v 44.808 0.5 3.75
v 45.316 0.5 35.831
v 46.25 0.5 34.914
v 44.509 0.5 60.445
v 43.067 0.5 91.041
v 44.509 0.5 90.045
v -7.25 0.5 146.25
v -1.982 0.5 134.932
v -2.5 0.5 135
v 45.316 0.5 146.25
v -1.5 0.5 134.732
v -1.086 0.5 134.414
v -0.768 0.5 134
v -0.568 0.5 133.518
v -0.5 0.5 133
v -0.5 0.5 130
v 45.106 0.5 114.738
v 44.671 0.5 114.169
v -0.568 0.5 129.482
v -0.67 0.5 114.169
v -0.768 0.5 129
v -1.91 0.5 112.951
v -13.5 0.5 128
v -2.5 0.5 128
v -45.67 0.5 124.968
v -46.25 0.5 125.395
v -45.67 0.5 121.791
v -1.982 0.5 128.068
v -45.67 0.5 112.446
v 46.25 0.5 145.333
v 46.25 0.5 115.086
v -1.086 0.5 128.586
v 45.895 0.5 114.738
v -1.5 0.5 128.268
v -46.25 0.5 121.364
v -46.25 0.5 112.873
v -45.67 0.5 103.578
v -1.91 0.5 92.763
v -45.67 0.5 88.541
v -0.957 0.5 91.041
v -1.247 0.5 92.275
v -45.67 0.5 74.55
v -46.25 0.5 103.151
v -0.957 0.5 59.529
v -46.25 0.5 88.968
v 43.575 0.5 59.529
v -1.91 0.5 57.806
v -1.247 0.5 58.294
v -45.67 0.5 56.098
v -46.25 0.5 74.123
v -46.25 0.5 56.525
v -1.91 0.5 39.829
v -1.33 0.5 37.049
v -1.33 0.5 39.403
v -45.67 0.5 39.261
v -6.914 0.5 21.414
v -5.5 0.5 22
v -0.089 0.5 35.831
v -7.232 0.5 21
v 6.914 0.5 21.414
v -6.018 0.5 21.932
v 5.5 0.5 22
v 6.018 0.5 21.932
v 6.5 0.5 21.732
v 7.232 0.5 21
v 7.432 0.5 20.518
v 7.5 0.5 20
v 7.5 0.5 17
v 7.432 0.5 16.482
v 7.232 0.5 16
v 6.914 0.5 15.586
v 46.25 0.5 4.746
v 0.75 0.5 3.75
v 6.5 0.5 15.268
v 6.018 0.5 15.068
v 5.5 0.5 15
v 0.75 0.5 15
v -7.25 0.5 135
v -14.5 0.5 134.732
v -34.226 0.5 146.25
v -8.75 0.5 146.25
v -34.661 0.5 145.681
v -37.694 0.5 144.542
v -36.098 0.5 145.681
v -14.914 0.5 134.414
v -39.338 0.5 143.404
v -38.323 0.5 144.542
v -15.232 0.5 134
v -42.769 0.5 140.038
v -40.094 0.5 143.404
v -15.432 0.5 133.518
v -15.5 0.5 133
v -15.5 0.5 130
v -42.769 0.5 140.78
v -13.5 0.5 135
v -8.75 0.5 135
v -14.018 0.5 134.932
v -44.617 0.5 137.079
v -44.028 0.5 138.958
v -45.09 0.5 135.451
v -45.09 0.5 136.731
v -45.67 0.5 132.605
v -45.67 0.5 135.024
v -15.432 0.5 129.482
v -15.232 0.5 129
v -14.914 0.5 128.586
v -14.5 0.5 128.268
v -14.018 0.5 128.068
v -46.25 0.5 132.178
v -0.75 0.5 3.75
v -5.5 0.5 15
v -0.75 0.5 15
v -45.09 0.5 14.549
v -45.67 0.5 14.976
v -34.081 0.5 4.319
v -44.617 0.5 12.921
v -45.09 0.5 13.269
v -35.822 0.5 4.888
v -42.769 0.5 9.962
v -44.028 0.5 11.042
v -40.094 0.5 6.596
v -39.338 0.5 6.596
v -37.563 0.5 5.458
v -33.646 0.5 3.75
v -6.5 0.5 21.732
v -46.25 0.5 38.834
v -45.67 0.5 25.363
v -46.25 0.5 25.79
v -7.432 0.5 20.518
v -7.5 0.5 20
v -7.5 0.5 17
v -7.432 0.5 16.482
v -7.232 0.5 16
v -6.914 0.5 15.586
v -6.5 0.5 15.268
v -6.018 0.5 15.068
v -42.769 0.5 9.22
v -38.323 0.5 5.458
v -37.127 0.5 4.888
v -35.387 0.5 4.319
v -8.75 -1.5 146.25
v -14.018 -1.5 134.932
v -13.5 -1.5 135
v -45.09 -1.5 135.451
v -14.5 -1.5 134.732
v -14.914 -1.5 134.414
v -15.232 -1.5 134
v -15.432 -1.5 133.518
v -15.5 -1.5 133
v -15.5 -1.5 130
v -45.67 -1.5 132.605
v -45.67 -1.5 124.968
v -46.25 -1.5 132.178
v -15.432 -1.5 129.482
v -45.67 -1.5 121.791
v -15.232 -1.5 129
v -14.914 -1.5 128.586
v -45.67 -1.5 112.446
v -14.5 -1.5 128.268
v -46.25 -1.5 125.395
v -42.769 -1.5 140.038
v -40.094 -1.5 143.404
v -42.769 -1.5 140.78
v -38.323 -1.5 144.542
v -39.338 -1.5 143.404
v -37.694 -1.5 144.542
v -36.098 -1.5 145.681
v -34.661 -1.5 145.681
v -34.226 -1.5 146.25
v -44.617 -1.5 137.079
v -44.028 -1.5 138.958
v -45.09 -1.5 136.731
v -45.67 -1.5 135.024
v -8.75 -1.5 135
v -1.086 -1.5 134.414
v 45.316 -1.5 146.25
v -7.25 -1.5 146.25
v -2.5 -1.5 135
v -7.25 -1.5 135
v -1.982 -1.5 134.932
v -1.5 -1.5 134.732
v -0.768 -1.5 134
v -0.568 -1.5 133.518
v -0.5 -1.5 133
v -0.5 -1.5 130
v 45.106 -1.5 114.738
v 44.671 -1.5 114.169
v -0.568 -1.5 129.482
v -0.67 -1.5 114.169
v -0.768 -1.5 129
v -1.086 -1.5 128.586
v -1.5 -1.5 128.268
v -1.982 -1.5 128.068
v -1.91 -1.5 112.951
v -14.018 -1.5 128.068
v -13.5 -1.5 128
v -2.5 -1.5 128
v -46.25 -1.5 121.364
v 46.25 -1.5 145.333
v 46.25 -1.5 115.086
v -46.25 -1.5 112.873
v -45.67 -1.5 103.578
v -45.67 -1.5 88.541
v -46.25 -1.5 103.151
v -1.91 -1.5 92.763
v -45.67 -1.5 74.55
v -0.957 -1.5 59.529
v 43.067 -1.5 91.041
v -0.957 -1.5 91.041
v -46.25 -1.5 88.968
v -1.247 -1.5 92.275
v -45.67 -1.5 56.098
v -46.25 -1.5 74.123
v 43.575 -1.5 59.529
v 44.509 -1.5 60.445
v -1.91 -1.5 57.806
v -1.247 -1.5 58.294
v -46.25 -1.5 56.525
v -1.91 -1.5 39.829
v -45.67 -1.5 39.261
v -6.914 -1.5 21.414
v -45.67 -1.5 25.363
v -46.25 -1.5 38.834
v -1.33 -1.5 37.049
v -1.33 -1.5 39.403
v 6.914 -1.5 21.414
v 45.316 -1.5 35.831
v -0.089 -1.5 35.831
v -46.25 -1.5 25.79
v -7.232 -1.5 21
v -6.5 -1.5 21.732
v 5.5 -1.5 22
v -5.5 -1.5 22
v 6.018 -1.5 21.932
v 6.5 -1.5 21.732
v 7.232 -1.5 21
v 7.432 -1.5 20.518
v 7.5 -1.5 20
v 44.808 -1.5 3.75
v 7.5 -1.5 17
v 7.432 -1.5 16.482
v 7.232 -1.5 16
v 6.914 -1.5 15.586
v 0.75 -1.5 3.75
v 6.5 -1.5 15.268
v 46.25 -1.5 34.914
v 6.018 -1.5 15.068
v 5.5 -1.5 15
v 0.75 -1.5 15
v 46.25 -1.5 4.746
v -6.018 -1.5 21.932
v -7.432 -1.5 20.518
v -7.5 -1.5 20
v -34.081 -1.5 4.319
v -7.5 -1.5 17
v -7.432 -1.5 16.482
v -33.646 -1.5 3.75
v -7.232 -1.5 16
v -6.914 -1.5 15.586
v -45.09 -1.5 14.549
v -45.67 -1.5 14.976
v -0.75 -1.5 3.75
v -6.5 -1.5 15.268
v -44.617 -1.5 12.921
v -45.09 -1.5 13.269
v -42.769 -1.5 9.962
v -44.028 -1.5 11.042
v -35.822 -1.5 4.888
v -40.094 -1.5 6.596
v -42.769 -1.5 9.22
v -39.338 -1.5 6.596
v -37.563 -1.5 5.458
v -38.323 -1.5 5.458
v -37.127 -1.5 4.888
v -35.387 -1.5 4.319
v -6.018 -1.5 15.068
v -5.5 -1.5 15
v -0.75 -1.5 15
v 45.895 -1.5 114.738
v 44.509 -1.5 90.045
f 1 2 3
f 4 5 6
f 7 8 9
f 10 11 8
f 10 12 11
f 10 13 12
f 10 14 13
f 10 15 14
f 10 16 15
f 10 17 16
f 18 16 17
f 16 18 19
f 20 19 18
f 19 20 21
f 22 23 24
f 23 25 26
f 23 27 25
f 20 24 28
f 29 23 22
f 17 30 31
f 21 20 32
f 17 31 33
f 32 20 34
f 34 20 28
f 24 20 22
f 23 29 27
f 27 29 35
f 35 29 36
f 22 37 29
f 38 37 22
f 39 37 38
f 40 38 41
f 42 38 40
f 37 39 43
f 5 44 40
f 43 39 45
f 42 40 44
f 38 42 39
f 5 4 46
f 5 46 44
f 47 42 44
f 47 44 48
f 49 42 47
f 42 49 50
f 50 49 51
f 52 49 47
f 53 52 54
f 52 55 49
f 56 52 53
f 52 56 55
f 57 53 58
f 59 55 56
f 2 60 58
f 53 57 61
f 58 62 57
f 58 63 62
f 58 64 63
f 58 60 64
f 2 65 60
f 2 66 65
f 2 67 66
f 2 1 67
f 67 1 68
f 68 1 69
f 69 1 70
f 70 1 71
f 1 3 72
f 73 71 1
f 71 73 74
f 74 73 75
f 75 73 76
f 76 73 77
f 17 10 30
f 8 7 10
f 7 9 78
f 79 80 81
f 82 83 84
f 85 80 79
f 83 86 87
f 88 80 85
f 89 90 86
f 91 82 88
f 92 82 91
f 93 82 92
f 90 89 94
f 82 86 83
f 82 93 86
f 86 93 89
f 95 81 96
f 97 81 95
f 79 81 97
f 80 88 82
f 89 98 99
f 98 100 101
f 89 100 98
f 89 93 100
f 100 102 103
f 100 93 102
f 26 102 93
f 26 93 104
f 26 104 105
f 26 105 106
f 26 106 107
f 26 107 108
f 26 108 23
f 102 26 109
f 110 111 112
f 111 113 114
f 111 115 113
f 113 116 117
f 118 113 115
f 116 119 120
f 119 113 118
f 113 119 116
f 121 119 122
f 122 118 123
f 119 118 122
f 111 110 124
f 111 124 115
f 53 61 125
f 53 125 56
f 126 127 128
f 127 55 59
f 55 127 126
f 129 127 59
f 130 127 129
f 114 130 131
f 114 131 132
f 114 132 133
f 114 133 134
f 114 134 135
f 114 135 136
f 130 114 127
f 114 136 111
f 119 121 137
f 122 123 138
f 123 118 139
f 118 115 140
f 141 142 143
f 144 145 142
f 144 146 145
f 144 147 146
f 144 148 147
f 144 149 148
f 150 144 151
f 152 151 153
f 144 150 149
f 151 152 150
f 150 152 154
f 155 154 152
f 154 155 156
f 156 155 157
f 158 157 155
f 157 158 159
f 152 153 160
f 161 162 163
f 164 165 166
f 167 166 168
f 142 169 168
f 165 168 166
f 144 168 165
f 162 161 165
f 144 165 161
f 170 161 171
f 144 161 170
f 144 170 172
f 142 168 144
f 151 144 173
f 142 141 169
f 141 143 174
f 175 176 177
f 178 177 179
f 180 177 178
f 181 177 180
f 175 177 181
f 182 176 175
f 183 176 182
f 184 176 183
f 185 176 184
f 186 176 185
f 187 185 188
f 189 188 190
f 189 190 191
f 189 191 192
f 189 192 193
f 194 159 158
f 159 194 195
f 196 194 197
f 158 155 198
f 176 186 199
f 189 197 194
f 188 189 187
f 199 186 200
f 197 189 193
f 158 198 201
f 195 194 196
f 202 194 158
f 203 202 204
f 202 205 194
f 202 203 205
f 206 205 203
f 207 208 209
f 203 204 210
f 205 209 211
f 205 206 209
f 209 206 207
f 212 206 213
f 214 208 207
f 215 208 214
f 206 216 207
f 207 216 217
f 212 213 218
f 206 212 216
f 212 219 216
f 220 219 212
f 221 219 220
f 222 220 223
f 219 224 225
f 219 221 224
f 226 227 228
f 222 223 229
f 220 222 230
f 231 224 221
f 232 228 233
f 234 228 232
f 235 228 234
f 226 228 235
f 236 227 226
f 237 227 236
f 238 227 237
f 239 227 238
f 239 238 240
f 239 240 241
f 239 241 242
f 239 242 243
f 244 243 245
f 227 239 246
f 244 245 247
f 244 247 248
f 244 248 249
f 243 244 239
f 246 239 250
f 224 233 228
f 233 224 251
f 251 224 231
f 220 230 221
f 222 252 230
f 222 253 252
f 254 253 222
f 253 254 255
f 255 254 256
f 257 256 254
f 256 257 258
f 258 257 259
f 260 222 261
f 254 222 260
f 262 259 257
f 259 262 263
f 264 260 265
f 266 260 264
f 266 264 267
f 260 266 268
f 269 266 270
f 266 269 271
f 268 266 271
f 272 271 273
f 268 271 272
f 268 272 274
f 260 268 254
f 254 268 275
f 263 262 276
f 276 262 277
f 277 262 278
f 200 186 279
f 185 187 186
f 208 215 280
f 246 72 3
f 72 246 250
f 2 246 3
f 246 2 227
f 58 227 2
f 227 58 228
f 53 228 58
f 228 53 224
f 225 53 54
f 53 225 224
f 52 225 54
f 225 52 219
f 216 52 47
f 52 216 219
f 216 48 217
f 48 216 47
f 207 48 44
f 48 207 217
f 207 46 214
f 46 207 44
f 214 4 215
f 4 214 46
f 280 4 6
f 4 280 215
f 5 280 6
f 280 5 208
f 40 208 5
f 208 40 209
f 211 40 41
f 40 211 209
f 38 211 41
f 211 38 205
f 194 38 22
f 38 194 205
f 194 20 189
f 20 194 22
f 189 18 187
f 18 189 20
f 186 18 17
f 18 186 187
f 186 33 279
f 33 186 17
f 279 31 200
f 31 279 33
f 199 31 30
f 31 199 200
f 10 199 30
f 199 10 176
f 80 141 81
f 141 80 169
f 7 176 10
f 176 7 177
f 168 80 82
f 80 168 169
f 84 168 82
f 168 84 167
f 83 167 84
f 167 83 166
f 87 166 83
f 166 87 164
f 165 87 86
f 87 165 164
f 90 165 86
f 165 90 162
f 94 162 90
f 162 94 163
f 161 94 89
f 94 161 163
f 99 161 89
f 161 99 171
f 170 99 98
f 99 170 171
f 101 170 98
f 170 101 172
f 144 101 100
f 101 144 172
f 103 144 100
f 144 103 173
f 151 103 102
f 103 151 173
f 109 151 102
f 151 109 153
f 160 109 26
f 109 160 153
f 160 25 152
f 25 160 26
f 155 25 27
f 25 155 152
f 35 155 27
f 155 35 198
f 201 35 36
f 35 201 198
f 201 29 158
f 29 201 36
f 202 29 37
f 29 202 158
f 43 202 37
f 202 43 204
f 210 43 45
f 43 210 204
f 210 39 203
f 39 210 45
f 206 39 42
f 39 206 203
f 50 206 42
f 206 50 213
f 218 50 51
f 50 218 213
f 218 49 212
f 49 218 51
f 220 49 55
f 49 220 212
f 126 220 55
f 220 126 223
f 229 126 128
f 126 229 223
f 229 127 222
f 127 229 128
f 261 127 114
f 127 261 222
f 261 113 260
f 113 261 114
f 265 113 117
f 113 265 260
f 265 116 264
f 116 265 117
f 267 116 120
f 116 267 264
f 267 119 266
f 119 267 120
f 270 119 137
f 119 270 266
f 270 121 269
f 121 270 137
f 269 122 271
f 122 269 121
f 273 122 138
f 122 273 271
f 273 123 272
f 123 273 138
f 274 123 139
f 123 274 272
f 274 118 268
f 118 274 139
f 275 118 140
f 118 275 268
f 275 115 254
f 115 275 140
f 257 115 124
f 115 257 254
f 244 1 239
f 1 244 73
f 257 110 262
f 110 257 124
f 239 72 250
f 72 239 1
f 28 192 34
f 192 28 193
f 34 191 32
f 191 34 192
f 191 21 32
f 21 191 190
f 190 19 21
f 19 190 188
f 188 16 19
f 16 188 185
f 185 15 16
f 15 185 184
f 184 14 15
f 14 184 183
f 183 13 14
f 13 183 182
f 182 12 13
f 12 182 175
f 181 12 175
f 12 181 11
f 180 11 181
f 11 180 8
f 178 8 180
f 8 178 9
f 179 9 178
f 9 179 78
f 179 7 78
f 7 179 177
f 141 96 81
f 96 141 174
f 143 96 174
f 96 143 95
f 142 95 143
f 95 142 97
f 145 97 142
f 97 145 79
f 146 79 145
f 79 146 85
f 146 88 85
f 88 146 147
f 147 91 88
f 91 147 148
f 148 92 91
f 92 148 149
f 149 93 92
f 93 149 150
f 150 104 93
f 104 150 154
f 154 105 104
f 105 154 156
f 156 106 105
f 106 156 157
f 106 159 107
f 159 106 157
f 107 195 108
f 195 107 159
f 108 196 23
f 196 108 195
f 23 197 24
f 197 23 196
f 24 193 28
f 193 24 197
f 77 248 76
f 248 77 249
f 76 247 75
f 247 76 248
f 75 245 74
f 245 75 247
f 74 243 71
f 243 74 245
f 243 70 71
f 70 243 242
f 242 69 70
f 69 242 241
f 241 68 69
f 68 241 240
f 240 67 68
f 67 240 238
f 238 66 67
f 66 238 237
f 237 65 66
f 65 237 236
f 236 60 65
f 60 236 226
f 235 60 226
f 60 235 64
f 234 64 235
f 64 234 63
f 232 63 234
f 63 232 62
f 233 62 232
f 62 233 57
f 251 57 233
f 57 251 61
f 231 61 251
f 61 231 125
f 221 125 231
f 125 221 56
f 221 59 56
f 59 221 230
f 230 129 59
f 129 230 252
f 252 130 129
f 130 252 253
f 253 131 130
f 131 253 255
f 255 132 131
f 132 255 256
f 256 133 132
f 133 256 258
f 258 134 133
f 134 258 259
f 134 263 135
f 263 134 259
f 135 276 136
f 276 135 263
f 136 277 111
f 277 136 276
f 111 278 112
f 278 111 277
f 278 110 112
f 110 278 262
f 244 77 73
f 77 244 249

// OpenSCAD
// file: shape_pts.scad
// Letter "E" (#4 Middle) ? Top X=-8 Conduit (under g) + Bottom X=0 Conduit
// Vertical-display edition: bottom divider clip removed, interlocking hollow double-dovetail channels added.

shape_w = 94.00;
shape_h = 144.00;

rec_snap_top_x = 12.00;
rec_snap_top_z = 144.00;
rec_snap_bot_x = 0.00;

rec_top_conn_enable   = true;
rec_top_conn_x        = -8.00;
rec_bot_conn_enable   = true;
rec_bot_conn_x        = 0.00;
rec_left_conn_enable  = false;
rec_left_conn_z       = 0.00;
rec_left_conn_face_x  = 0.00;
rec_left_conn_pocket_x = 0.00;
rec_right_conn_enable = false;
rec_right_conn_z      = 0.00;
rec_right_conn_face_x = 0.00;
rec_right_conn_pocket_x = 0.00;

rec_magnet_enable = true;
rec_magnet_x      = -24.00;
rec_magnet_z      = 111.20;

rec_wall_mount_enable = true;
rec_wall_mount_x      = 0.00;
rec_wall_mount_z      = 72.30;

rec_include_controller = false;
rec_chip_x     = -24.50;
rec_chip_z     = 82.00;
rec_cable_x    = -24.50;
rec_ziptie_z   = 33.50;
rec_keyhole_z  = 19.50;
rec_slit_dir   = -1;

rec_pillars = [[28.0, 18.0], [25.0, 72.3], [28.0, 127.5], [-24.5, 38.0]];
rec_has_face_grooves = false;

shape_pts = [
    [0.218,33.581], [-0.58,34.364], [-0.58,36.783], [-1.16,37.209], [-1.16,54.427], [-0.58,54.854],
    [-0.363,55.779], [43.881,55.779], [45.259,57.13], [45.259,87.439], [43.301,88.791], [-0.363,88.791],
    [-0.58,89.715], [-1.16,90.142], [-1.16,109.636], [-0.363,110.419], [45.042,110.419], [45.477,110.988],
    [46.202,110.988], [47.0,111.771], [47.0,142.648], [45.622,144.0], [-34.597,144.0], [-35.032,143.431],
    [-36.338,143.431], [-37.934,142.292], [-38.659,142.292], [-39.674,141.154], [-40.4,141.154], [-43.519,138.095],
    [-43.519,137.383], [-44.679,136.387], [-45.259,134.538], [-45.84,134.111], [-45.84,132.83], [-46.42,132.403],
    [-46.42,129.984], [-47.0,129.557], [-47.0,122.016], [-46.42,121.589], [-46.42,119.17], [-47.0,118.743],
    [-47.0,109.494], [-46.42,109.067], [-46.42,100.957], [-47.0,100.53], [-47.0,85.589], [-46.42,85.162],
    [-46.42,71.929], [-47.0,71.502], [-47.0,53.146], [-46.42,52.719], [-46.42,36.64], [-47.0,36.213],
    [-47.0,22.411], [-46.42,21.984], [-46.42,11.597], [-45.84,11.17], [-45.84,9.889], [-45.259,9.462],
    [-44.679,7.613], [-43.519,6.617], [-43.519,5.905], [-40.4,2.846], [-39.674,2.846], [-38.659,1.708],
    [-37.934,1.708], [-37.498,1.138], [-36.193,1.138], [-35.758,0.569], [-34.452,0.569], [-34.017,0.0],
    [45.042,0.0], [47.0,1.352], [47.0,32.229], [45.622,33.581]
];
shape_paths = [[0, 1, 2, 3, 4, 5, 6, 7, 8, 9, 10, 11, 12, 13, 14, 15, 16, 17, 18, 19, 20, 21, 22, 23, 24, 25, 26, 27, 28, 29, 30, 31, 32, 33, 34, 35, 36, 37, 38, 39, 40, 41, 42, 43, 44, 45, 46, 47, 48, 49, 50, 51, 52, 53, 54, 55, 56, 57, 58, 59, 60, 61, 62, 63, 64, 65, 66, 67, 68, 69, 70, 71, 72, 73, 74, 75]];

diffuser_shape_pts = [
    [0.218,33.581], [-0.58,34.364], [-0.58,36.783], [-1.16,37.209], [-1.16,54.427], [-0.58,54.854],
    [-0.363,55.779], [43.881,55.779], [45.259,57.13], [45.259,87.439], [43.301,88.791], [-0.363,88.791],
    [-0.58,89.715], [-1.16,90.142], [-1.16,109.636], [-0.363,110.419], [45.042,110.419], [45.477,110.988],
    [46.202,110.988], [47.0,111.771], [47.0,142.648], [45.622,144.0], [-23.005,144.0], [-23.429,143.431],
    [-24.137,143.431], [-26.614,140.941], [-26.614,140.229], [-32.489,134.324], [-33.197,134.324], [-34.188,133.186],
    [-36.029,132.617], [-36.453,132.047], [-38.294,131.478], [-38.718,130.909], [-39.992,130.909], [-40.417,130.34],
    [-42.258,130.34], [-42.682,129.771], [-45.089,129.771], [-46.434,128.419], [-46.434,127.708], [-47.0,127.281],
    [-46.42,119.17], [-47.0,118.743], [-47.0,109.494], [-46.42,109.067], [-46.42,100.957], [-47.0,100.53],
    [-47.0,85.589], [-46.42,85.162], [-46.42,71.929], [-47.0,71.502], [-47.0,53.146], [-46.42,52.719],
    [-46.42,36.64], [-47.0,36.213], [-47.0,22.411], [-46.42,21.984], [-46.42,11.597], [-45.84,11.17],
    [-45.84,9.889], [-45.259,9.462], [-44.679,7.613], [-43.519,6.617], [-43.519,5.905], [-40.4,2.846],
    [-39.674,2.846], [-38.659,1.708], [-37.934,1.708], [-37.498,1.138], [-36.193,1.138], [-35.758,0.569],
    [-34.452,0.569], [-34.017,0.0], [45.042,0.0], [47.0,1.352], [47.0,32.229], [45.622,33.581]
];
diffuser_shape_paths = [[0, 1, 2, 3, 4, 5, 6, 7, 8, 9, 10, 11, 12, 13, 14, 15, 16, 17, 18, 19, 20, 21, 22, 23, 24, 25, 26, 27, 28, 29, 30, 31, 32, 33, 34, 35, 36, 37, 38, 39, 40, 41, 42, 43, 44, 45, 46, 47, 48, 49, 50, 51, 52, 53, 54, 55, 56, 57, 58, 59, 60, 61, 62, 63, 64, 65, 66, 67, 68, 69, 70, 71, 72, 73, 74, 75, 76, 77]];

module shape_2d(pts = shape_pts) {
    polygon(points = pts, paths = shape_paths);
}

module diffuser_shape_2d(pts = diffuser_shape_pts) {
    polygon(points = pts, paths = diffuser_shape_paths);
}

module diffuser_face_grooves_2d() {}
// main file
// Letter "E" (#4 Middle) ? Top X=-8 Conduit (under g) + Bottom X=0 Conduit ? internal white reflector plate (2.00 mm thick, aligned LED-strip conduit pockets + entry slits)
// Opens and exports standalone in OpenSCAD / OpenSCAD.js.

use <lamp_core.scad>

render_lamp_part("reflector");
